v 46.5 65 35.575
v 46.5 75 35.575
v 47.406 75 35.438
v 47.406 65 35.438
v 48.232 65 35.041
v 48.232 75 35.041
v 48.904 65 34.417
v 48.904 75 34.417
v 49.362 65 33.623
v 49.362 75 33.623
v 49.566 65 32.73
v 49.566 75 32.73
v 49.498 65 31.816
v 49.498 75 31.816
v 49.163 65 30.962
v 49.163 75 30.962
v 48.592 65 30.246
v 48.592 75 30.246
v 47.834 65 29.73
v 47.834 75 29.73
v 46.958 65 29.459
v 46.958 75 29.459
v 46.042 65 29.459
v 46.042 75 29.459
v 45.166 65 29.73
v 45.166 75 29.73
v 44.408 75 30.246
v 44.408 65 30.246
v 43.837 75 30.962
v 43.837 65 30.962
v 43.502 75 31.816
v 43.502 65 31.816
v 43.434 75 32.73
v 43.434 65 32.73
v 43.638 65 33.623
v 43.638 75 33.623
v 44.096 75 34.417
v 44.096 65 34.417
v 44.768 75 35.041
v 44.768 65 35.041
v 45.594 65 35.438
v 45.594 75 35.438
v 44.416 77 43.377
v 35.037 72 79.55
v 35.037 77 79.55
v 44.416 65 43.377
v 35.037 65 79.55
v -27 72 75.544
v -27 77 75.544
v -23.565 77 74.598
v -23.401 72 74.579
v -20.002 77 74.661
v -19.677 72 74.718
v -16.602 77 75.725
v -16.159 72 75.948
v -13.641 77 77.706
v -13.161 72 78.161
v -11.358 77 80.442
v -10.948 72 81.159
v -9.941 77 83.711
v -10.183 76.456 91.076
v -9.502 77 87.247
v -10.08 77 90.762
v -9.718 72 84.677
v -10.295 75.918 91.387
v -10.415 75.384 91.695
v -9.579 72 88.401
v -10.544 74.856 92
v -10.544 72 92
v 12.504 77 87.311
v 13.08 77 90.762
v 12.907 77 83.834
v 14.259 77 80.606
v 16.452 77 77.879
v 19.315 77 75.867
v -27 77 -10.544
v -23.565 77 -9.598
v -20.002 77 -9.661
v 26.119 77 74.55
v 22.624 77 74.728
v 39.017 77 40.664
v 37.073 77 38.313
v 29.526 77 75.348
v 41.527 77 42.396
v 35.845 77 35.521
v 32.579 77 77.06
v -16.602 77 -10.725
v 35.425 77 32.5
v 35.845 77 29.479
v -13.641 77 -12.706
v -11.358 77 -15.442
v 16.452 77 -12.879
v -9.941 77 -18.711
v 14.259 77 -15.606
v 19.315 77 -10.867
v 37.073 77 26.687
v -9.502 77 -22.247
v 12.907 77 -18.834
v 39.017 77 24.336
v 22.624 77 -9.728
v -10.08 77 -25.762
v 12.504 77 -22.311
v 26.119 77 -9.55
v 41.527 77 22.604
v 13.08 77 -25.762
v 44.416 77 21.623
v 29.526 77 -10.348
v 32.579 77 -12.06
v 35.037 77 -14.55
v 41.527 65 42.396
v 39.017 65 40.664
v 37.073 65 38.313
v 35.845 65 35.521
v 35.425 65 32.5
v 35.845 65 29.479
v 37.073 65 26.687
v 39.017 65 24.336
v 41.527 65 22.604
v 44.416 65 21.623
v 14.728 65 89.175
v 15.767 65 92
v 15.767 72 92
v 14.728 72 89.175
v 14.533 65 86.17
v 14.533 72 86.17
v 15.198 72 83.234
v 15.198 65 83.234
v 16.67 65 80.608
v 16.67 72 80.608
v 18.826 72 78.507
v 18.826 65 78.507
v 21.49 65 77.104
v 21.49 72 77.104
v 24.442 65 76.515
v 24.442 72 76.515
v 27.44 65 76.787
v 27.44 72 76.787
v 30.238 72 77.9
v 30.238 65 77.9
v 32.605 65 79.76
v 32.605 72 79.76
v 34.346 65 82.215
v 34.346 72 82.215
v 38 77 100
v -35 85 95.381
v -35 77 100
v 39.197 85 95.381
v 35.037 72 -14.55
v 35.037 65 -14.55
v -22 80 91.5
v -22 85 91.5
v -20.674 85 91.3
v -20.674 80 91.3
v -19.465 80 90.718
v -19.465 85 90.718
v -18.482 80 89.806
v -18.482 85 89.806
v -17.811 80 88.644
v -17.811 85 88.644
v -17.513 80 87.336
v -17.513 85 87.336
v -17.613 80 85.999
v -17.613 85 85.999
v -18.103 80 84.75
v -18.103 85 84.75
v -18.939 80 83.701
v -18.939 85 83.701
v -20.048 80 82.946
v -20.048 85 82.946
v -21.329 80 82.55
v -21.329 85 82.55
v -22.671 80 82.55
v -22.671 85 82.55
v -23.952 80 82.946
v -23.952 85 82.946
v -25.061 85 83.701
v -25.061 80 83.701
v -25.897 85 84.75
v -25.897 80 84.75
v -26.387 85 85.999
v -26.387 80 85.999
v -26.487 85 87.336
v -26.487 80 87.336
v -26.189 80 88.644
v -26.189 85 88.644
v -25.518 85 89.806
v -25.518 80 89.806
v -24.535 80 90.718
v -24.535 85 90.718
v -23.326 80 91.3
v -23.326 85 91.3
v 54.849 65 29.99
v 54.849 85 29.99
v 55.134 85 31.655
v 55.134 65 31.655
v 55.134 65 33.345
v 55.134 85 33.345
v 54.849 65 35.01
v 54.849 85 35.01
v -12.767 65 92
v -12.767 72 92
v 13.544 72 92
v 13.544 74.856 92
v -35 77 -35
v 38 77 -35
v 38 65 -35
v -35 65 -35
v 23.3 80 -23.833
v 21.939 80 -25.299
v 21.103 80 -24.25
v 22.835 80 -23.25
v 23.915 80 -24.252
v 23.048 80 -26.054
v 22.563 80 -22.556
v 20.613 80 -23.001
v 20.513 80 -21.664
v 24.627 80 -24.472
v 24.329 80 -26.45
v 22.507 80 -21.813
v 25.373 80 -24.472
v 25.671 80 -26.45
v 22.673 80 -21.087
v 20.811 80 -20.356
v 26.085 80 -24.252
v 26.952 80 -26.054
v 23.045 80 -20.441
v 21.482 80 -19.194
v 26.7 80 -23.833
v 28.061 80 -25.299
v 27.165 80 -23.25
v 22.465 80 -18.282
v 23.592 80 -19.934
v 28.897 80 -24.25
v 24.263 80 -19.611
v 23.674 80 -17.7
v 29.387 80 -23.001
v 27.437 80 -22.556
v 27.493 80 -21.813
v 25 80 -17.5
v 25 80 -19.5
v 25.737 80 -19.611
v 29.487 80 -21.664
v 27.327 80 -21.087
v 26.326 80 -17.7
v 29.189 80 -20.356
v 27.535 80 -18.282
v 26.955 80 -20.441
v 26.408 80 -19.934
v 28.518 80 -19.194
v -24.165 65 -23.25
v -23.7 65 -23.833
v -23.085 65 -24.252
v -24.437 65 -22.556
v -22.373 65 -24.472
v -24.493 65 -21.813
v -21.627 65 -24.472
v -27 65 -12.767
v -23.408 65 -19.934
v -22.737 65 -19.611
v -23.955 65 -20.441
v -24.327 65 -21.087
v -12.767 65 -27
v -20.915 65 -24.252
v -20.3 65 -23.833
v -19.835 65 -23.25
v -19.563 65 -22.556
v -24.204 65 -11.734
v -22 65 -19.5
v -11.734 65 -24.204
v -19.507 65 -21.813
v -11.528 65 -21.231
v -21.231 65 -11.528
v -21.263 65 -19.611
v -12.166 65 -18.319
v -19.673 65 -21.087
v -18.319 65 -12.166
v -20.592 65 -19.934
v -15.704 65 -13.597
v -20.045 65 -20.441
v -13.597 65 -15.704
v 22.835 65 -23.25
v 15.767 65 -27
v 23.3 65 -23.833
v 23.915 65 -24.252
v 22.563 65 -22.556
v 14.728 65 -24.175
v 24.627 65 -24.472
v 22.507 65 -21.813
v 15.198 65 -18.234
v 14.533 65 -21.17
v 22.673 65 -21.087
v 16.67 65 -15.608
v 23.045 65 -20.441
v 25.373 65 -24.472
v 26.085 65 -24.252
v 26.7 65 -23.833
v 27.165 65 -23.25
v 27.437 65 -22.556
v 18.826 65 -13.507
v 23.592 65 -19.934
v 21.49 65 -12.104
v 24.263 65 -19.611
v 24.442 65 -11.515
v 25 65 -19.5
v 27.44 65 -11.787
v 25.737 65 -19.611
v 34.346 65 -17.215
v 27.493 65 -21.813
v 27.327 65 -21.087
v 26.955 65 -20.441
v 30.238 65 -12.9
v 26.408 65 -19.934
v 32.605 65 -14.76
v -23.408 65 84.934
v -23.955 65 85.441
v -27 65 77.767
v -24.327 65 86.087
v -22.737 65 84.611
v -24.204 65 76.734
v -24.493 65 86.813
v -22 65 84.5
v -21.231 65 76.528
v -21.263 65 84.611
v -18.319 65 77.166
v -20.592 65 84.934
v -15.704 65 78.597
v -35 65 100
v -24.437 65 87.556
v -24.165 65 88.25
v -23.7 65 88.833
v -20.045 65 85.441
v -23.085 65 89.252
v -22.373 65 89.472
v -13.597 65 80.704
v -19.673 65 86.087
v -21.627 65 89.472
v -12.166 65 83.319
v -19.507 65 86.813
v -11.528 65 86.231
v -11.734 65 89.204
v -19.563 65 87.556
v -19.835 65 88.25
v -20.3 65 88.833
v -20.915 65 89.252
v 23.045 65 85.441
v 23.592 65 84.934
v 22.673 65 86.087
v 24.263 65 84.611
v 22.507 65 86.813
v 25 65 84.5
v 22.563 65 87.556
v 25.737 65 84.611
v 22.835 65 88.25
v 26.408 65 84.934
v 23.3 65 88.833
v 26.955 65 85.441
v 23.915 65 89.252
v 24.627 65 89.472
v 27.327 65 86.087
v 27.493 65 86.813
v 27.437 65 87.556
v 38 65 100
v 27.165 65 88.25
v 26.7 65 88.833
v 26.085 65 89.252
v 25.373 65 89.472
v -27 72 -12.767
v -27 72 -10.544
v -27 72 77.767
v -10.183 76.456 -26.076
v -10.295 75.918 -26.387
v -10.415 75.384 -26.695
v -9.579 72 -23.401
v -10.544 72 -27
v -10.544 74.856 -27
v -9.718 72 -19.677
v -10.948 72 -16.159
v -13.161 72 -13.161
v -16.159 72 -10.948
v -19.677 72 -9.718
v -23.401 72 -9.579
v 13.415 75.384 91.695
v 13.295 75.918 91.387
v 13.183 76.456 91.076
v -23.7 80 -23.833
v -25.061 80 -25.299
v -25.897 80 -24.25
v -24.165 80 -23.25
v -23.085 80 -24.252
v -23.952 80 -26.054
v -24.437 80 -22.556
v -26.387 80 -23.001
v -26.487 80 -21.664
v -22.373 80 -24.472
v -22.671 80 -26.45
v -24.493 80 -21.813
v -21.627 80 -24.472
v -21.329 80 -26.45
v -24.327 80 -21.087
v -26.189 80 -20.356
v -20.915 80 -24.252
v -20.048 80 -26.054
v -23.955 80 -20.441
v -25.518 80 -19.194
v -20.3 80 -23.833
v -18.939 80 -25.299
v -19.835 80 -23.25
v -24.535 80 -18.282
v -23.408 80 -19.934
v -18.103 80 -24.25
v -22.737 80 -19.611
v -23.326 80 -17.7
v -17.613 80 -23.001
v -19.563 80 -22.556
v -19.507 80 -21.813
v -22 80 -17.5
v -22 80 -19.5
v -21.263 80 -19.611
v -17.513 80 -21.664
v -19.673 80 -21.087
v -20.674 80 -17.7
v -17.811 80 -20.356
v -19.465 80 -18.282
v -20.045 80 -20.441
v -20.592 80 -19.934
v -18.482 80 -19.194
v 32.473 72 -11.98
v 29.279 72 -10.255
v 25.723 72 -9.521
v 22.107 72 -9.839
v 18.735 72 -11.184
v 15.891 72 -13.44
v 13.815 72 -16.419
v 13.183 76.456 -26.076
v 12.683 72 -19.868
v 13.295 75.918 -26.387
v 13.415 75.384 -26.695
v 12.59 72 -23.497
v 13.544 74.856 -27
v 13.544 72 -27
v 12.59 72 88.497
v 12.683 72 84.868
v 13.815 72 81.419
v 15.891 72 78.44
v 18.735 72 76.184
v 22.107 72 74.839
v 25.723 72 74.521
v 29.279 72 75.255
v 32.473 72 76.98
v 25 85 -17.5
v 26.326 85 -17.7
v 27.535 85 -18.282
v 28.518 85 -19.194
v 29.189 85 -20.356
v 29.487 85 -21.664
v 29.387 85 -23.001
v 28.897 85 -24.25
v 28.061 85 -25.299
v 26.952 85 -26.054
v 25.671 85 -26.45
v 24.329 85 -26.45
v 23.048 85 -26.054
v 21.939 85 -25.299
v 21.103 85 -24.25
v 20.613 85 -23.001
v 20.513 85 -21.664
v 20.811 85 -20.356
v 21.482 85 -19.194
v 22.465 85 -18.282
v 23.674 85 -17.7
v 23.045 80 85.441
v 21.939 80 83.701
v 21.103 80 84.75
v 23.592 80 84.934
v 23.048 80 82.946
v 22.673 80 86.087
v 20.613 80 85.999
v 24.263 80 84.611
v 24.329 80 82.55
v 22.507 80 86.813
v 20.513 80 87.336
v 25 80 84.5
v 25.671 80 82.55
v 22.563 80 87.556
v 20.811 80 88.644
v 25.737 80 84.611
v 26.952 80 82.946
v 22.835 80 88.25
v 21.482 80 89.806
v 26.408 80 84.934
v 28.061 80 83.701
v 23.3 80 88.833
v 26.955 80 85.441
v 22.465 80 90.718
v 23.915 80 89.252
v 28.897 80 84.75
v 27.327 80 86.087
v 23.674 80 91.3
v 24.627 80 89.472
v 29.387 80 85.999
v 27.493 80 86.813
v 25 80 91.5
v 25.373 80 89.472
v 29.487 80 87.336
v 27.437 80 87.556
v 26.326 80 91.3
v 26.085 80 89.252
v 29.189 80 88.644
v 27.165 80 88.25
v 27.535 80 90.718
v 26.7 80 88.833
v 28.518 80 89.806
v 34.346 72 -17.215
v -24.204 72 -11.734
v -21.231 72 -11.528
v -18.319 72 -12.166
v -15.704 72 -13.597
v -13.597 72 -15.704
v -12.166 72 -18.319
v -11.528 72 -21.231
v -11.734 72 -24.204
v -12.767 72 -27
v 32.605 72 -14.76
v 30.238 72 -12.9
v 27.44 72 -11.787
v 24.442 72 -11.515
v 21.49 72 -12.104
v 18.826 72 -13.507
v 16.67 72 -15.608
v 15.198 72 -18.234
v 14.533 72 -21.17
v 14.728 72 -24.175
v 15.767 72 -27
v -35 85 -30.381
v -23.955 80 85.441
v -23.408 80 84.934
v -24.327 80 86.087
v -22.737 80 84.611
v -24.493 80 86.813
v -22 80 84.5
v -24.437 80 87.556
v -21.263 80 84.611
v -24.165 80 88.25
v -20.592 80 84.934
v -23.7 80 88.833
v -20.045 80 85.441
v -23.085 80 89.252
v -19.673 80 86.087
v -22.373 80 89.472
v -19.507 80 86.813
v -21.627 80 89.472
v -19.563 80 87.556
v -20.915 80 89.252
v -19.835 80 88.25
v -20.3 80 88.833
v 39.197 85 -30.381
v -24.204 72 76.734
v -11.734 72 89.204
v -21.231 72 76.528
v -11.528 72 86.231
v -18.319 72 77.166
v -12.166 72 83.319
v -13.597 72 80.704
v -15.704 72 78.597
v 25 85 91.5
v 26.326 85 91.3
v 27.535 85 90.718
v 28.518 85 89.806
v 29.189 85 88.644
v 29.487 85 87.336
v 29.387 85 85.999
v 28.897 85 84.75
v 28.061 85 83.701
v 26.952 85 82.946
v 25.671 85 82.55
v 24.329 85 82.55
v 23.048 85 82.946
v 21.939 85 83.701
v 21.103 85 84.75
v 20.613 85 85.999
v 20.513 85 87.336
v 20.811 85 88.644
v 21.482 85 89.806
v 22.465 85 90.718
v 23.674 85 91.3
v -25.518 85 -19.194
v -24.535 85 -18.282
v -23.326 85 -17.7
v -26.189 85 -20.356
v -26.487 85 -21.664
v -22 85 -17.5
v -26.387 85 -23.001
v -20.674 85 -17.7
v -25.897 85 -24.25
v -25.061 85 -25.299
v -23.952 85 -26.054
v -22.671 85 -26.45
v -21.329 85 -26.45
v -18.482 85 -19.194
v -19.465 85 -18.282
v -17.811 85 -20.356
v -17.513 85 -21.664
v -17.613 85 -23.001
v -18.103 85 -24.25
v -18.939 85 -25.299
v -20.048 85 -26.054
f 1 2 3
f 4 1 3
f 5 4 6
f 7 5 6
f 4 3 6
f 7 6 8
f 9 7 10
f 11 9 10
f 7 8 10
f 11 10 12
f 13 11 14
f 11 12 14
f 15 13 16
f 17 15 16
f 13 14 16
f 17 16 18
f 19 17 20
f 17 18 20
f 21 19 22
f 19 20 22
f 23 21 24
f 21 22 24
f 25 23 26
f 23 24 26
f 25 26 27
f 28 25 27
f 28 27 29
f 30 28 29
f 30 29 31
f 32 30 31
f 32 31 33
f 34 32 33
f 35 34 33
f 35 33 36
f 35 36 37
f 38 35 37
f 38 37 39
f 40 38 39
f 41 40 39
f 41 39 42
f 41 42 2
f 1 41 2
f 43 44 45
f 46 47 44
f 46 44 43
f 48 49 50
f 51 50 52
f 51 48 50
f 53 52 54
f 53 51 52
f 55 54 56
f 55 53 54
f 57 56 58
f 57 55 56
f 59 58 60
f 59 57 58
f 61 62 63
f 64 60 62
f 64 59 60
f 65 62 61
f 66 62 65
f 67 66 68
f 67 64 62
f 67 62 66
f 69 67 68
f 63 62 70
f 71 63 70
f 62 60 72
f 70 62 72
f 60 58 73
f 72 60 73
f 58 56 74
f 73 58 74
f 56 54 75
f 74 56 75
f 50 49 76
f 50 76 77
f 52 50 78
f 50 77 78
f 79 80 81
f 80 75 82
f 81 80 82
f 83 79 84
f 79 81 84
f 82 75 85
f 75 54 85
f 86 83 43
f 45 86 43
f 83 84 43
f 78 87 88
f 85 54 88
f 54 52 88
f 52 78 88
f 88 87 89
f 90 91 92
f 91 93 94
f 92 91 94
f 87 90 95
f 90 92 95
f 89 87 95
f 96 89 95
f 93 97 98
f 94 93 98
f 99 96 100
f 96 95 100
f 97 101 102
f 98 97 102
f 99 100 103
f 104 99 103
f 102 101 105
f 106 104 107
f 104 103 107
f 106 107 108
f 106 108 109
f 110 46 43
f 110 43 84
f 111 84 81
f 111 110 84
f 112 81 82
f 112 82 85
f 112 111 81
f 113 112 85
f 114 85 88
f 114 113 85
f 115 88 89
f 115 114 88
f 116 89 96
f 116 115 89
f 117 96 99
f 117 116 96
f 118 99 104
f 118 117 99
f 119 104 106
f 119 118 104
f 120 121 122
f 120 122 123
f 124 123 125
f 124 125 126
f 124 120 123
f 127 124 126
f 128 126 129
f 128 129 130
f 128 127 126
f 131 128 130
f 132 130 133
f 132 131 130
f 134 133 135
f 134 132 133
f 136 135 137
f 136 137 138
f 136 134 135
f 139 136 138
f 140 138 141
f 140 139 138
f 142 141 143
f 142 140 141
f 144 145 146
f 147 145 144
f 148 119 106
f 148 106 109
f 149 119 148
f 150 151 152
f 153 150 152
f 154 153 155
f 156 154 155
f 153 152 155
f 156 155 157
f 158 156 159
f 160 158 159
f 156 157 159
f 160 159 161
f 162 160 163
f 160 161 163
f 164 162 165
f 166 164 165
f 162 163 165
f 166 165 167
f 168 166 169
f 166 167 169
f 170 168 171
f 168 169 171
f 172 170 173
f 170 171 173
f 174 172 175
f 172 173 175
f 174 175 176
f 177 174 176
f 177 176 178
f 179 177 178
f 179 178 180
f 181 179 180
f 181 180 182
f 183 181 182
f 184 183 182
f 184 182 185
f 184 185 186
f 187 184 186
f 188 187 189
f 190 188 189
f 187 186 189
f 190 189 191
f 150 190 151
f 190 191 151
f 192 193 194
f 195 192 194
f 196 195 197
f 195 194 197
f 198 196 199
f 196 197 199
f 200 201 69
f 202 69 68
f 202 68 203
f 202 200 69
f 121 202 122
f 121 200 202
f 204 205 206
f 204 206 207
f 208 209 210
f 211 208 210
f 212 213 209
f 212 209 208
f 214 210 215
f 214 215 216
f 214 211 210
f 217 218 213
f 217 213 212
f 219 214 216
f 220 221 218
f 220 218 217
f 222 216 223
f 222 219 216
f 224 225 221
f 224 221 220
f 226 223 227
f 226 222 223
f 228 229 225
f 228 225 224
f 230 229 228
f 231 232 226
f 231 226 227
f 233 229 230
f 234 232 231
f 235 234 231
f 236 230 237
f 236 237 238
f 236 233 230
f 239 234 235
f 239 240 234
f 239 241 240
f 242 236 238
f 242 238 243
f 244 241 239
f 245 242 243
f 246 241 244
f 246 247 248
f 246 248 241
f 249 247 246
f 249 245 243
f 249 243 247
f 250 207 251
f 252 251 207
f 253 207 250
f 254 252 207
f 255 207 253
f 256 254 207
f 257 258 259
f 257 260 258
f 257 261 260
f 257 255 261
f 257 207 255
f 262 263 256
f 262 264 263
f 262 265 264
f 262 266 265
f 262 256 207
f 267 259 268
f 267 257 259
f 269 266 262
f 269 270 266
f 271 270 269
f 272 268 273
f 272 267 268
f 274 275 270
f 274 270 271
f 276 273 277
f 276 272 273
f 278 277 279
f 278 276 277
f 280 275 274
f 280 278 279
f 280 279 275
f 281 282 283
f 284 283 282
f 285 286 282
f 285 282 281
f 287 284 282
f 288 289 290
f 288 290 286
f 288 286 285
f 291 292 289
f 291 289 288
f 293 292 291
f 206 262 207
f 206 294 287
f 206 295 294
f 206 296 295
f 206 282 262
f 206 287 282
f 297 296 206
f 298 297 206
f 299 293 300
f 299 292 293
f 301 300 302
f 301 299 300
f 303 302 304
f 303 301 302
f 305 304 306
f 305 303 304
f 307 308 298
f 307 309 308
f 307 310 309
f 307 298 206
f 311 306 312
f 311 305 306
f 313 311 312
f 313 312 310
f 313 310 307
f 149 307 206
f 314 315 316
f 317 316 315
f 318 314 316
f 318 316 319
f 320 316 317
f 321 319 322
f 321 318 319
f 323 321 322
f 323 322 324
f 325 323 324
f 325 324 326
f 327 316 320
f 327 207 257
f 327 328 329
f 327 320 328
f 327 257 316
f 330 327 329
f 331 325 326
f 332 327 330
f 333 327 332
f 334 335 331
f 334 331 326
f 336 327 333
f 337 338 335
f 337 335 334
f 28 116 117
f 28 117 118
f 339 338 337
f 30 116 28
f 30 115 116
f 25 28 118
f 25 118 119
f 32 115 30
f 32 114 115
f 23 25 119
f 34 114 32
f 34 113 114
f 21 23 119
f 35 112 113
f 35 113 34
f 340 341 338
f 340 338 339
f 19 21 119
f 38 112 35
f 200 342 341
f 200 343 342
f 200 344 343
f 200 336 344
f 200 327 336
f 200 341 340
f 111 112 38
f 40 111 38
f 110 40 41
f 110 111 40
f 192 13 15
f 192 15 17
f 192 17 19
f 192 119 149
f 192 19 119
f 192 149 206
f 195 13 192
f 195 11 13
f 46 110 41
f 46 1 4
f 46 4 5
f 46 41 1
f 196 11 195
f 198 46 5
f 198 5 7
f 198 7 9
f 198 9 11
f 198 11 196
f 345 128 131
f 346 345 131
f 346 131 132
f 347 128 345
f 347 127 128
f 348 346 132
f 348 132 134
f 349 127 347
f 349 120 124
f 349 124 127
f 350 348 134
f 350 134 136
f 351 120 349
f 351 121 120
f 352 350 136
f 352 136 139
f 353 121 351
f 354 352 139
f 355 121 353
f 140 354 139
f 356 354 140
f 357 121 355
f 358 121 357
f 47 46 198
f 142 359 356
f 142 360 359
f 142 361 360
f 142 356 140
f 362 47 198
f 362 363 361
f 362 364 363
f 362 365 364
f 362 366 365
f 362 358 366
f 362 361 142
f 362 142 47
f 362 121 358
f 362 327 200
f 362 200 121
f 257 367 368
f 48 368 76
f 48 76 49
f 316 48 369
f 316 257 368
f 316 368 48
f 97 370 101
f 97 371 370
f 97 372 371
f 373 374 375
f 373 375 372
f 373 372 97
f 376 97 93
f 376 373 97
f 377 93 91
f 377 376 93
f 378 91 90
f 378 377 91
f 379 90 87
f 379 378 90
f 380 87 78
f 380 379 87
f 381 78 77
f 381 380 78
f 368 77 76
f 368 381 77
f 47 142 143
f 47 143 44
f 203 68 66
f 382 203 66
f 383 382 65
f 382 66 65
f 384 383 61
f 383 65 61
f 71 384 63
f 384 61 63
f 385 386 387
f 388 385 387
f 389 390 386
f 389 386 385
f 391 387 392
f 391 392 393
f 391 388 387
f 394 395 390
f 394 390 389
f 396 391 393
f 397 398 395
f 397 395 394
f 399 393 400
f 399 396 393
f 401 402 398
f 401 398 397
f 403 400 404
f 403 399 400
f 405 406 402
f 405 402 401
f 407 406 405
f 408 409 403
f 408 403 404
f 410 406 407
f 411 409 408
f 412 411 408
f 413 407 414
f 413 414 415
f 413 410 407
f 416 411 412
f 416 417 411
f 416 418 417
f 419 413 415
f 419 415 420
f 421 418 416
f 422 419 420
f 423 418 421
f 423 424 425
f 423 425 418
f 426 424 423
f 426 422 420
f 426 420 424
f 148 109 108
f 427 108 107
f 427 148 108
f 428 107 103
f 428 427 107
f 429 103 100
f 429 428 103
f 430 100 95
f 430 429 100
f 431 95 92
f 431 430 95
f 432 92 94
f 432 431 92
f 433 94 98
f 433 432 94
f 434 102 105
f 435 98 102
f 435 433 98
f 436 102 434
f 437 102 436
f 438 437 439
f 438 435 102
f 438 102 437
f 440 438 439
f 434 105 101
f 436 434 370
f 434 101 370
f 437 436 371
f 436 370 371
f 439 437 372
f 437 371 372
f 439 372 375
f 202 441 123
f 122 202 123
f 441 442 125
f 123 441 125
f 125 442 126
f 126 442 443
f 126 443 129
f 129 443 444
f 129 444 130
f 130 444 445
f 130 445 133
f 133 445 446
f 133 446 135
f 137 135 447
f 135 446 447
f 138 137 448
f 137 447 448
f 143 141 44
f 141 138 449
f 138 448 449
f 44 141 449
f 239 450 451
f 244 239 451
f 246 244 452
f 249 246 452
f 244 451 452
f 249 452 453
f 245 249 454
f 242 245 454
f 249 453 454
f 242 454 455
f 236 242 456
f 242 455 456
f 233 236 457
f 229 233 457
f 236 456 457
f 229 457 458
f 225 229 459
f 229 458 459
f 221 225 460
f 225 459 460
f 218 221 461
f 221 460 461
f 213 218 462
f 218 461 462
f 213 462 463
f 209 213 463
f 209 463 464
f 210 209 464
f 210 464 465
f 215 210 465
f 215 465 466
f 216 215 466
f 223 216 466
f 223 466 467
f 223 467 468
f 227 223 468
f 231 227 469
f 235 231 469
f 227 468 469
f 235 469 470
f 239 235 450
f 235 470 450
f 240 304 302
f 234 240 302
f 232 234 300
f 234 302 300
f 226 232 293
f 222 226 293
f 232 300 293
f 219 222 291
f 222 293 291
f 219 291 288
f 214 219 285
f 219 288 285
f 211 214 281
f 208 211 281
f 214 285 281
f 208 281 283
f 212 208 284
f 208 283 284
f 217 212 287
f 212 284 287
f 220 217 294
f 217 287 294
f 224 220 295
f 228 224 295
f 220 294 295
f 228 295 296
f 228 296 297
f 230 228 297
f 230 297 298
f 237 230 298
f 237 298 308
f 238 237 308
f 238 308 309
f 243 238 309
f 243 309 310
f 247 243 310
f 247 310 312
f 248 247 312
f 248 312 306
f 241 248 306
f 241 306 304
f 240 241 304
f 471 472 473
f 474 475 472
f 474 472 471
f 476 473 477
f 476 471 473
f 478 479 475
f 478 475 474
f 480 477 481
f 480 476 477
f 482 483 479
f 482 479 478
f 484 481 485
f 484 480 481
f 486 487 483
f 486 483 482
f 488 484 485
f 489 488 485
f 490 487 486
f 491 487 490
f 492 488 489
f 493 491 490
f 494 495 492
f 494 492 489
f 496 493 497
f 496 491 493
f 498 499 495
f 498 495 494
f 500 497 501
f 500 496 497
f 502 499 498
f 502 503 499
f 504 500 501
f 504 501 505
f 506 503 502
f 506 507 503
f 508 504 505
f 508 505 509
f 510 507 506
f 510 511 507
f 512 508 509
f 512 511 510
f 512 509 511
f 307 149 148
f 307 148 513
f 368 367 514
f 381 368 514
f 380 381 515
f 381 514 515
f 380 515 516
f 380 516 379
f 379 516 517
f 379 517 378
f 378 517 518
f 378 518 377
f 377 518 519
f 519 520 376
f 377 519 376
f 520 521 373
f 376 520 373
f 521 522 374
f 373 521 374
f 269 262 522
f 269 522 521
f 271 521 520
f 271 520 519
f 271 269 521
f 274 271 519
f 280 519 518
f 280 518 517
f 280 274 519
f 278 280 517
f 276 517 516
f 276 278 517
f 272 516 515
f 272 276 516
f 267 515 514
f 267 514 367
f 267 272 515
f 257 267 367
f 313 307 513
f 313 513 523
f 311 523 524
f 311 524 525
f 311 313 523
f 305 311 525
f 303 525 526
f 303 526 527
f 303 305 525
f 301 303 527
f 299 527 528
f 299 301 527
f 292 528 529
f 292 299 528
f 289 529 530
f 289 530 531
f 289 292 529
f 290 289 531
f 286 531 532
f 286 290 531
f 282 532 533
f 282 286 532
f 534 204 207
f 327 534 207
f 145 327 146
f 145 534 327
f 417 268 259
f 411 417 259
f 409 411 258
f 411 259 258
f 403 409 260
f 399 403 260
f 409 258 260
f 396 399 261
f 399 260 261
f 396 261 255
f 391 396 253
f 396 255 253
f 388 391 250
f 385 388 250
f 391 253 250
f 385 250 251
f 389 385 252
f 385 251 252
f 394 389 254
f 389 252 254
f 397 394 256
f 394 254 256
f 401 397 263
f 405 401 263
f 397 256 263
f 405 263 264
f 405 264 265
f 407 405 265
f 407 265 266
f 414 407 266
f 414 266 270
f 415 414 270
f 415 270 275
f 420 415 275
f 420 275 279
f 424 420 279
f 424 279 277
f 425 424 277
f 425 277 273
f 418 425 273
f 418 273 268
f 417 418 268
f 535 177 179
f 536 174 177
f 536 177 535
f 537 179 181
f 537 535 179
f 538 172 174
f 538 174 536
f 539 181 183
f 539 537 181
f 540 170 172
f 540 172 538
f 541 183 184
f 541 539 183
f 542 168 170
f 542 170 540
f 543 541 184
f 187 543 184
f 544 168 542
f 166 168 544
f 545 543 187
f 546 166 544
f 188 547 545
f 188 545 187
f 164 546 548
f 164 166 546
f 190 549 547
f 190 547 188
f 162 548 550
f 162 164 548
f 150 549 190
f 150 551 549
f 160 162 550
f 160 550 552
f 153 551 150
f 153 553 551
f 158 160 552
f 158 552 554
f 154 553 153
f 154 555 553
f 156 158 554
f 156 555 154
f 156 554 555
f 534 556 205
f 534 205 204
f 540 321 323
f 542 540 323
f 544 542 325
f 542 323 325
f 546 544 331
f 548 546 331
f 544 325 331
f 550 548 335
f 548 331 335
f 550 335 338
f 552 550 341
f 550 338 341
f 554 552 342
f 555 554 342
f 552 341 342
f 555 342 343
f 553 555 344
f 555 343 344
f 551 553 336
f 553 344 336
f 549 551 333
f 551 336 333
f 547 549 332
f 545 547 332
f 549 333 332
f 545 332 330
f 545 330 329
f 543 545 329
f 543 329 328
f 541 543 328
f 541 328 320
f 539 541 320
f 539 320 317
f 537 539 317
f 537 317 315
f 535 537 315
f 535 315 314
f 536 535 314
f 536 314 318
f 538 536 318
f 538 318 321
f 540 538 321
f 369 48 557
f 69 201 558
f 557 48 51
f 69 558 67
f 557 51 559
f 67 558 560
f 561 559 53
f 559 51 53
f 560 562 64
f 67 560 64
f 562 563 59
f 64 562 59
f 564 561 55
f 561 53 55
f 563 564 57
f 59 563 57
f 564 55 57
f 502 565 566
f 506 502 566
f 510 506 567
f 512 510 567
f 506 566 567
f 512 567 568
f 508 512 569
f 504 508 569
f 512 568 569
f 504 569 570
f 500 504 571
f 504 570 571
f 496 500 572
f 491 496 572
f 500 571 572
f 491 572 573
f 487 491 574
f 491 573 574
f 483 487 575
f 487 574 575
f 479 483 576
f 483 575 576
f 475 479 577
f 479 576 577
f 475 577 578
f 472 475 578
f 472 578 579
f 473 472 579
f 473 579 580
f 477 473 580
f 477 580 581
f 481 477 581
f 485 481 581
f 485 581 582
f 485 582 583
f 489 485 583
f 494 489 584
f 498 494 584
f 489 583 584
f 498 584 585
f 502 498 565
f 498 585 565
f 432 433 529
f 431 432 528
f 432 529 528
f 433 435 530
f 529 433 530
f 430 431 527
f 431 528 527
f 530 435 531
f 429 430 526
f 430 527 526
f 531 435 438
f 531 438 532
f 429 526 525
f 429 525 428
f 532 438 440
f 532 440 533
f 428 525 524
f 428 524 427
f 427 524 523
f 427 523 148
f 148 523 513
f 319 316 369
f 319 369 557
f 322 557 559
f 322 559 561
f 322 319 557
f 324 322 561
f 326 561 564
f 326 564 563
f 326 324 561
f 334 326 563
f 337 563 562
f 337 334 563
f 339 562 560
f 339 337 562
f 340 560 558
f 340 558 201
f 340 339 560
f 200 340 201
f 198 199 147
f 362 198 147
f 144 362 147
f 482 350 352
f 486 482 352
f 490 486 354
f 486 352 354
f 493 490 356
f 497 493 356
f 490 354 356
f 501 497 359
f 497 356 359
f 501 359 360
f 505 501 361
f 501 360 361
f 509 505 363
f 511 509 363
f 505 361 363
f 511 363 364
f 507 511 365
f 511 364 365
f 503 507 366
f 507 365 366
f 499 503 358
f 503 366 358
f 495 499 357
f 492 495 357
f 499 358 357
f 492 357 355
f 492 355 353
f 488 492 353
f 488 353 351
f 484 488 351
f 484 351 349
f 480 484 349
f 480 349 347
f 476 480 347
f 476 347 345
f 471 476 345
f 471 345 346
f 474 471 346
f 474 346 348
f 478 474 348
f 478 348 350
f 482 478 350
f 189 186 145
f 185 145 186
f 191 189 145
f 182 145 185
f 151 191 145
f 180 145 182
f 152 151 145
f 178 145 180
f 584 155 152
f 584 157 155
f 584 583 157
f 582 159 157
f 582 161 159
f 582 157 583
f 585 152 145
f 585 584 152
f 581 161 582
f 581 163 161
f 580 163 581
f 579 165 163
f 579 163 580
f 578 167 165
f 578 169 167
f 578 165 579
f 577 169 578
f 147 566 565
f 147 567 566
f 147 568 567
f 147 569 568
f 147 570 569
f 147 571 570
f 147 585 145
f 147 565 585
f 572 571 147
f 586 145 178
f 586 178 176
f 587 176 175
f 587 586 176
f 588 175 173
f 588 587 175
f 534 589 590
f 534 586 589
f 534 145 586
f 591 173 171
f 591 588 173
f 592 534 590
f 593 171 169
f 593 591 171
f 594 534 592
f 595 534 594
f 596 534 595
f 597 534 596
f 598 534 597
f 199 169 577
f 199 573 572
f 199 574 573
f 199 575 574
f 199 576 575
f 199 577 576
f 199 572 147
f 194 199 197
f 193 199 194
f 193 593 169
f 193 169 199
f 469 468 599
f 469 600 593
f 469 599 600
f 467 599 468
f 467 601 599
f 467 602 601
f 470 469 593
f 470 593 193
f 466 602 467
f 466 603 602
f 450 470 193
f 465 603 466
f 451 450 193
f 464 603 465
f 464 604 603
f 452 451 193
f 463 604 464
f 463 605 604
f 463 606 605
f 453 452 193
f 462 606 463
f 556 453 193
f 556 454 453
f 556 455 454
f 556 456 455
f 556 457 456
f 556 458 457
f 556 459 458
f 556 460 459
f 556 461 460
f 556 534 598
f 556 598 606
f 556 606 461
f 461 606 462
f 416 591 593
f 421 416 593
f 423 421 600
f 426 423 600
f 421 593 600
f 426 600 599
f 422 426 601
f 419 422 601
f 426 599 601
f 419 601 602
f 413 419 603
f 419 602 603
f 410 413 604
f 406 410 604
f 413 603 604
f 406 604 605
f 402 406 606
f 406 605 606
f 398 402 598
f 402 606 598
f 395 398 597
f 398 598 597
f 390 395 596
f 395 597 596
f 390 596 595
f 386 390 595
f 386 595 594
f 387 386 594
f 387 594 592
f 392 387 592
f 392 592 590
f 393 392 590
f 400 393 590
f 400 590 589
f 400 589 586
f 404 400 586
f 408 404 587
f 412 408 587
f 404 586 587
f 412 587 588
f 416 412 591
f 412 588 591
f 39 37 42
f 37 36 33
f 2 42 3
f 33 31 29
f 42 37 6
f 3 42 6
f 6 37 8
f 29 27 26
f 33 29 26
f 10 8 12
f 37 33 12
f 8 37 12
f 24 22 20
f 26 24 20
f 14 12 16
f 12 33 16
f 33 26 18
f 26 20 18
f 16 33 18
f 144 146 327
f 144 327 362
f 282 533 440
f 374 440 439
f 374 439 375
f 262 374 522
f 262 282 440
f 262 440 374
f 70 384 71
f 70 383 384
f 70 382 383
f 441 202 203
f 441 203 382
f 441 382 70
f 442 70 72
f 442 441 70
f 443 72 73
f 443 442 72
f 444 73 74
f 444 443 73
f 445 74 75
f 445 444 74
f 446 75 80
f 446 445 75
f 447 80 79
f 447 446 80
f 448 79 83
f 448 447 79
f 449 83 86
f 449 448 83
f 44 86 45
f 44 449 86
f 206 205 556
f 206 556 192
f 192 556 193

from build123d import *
from OCP.BRepFilletAPI import BRepFilletAPI_MakeChamfer

# Parameters (mm, degrees)
SALIENTE_EXTRUIR2_DEPTH     = 23
CROQUIS7_R                  = 20
CORTAR_EXTRUIR1_DEPTH       = 16
CROQUIS8_R                  = 10.25
CORTAR_EXTRUIR2_DEPTH       = 65.838641661
SALIENTE_EXTRUIR3_START     = 32
CROQUIS9_R                  = 20
CROQUIS9_R_2                = 3.075
CROQUIS9_R_3                = 10.25
SALIENTE_EXTRUIR3_DEPTH     = 32
CORTAR_EXTRUIR3_START       = -7
CROQUIS10_R                 = 20
CORTAR_EXTRUIR3_DEPTH       = 112.607172695
SALIENTE_EXTRUIR4_START     = 20
CROQUIS11_R                 = 3.075
CROQUIS11_R_2               = 20
SALIENTE_EXTRUIR4_DEPTH     = 20
CROQUIS12_R                 = 63
CORTAR_EXTRUIR4_DEPTH       = 3
CROQUIS13_R                 = 55
CORTAR_EXTRUIR5_DEPTH       = 10
SALIENTE_EXTRUIR5_START     = 10
SALIENTE_EXTRUIR5_DEPTH     = 10
CHAFL_N1_SIZE               = 8
CHAFL_N1_SIZE2              = 4.618802154
CROQUIS15_R                 = 6
CORTAR_EXTRUIR6_DEPTH       = 14.8
CORTAR_EXTRUIR7_REACH       = 233.334
CROQUIS17_R                 = 1.5
CORTAR_EXTRUIR9_REACH       = 225.907
CROQUIS19_R                 = 1.5
CORTAR_EXTRUIR10_START      = -50
CORTAR_EXTRUIR10_DEPTH      = 50
CROQUIS22_R                 = 3
CORTAR_EXTRUIR12_DEPTH      = 3
CROQUIS23_R                 = 3
CORTAR_EXTRUIR13_DEPTH      = 3
CROQUIS25_R                 = 2.5
CORTAR_EXTRUIR15_DEPTH      = 30
CROQUIS24_R                 = 2.5
CORTAR_EXTRUIR14_DEPTH      = 30
CROQUIS26_R                 = 2
CORTAR_EXTRUIR16_DEPTH      = 223.070371729
CROQUIS27_R                 = 3.5
CORTAR_EXTRUIR17_DEPTH      = 5
CORTAR_EXTRUIR18_DEPTH      = 3.25
CORTAR_EXTRUIR20_DEPTH      = 223.070371729
CORTAR_EXTRUIR20_DEPTH_BACK = 10
CROQUIS31_R                 = 2.5
CORTAR_EXTRUIR21_DEPTH      = 217.079267863
CROQUIS32_R                 = 4.5
CORTAR_EXTRUIR22_DEPTH      = 5
SALIENTE_EXTRUIR6_START     = 4
CROQUIS33_R                 = 55
CROQUIS33_R_2               = 6
SALIENTE_EXTRUIR6_DEPTH     = 4
SALIENTE_EXTRUIR7_START     = 3.35
CROQUIS34_R                 = 16.85
CROQUIS34_R_2               = 6
SALIENTE_EXTRUIR7_DEPTH     = 3.35
SALIENTE_EXTRUIR8_START     = 29
CROQUIS35_R                 = 10
CROQUIS35_R_2               = 6
SALIENTE_EXTRUIR8_DEPTH     = 29
CORTAR_EXTRUIR23_DEPTH      = 218.721088781
CORTAR_EXTRUIR23_DEPTH_BACK = 218.721088781
CROQUIS36_OUTSIDE_W         = 281.136
CROQUIS36_OUTSIDE_H         = 190.636
SALIENTE_EXTRUIR9_REACH     = 117.947
CROQUIS37_R                 = 20
VACIADO1_START              = 65
VACIADO1_DEPTH              = 12
VACIADO1_2_DEPTH            = 7
VACIADO1_START_2            = -12.766907344
VACIADO1_3_DEPTH            = 28.533814688


with BuildPart() as part:
    # Croquis2 → Saliente-Extruir2 (new body)
    with BuildSketch(Plane(origin=(0, 0, 0), x_dir=(1, 0, 0), z_dir=(0, 1, 0))):
        with BuildLine():
            Line((32.725022686, -35), (-35, -35))
            Line((-35, -35), (-35, 35))
            Line((-35, 35), (38, 35))
            Line((38, 35), (52.182846342, -19.705264464))
            ThreePointArc((52.182846342, -19.705264464), (38.869791903, -20.762030653), (32.5, -32.5))
            ThreePointArc((32.5, -32.5), (32.556369153, -33.755053307), (32.725022686, -35))
        make_face()
    extrude(amount=SALIENTE_EXTRUIR2_DEPTH)

    # Croquis7 → Cortar-Extruir1 (cut)
    with BuildSketch(Plane(origin=(0, 23, 0), x_dir=(1, 0, 0), z_dir=(0, 1, 0))):
        with Locations(Location((1.5, -1.5, 0), (0, 0, 270))):
            Circle(CROQUIS7_R)
    extrude(amount=-CORTAR_EXTRUIR1_DEPTH, mode=Mode.SUBTRACT)

    # Croquis8 → Cortar-Extruir2 (cut, through all)
    with BuildSketch(Plane(origin=(0, 7, 0), x_dir=(1, 0, 0), z_dir=(0, 1, 0))):
        with Locations(Location((1.5, -1.5, 0), (0, 0, 270))):
            Circle(CROQUIS8_R)
    extrude(amount=-CORTAR_EXTRUIR2_DEPTH, mode=Mode.SUBTRACT)

    # Croquis9 → Saliente-Extruir3 (add)
    with BuildSketch(Plane(origin=(0, 23, 0), x_dir=(1, 0, 0), z_dir=(0, 1, 0)).offset(SALIENTE_EXTRUIR3_START)):
        with BuildLine():
            Line((-35, 35), (-35, -100))
            Line((-35, -100), (38, -100))
            Line((38, -100), (54.849357366, -35.009621588))
            ThreePointArc((54.849357366, -35.009621588), (55.169388384, -32.5), (54.849357366, -29.990378412))
            Line((54.849357366, -29.990378412), (38, 35))
            Line((38, 35), (-35, 35))
        make_face()
        with Locations(Location((1.5, -1.5, 0), (0, 0, 270))):
            Circle(CROQUIS9_R, mode=Mode.SUBTRACT)
        with Locations(Location((46.5, -32.5, 0), (0, 0, 270))):
            Circle(CROQUIS9_R_2, mode=Mode.SUBTRACT)
        with Locations(Location((1.5, -63.5, 0), (0, 0, 90))):
            Circle(CROQUIS9_R_3, mode=Mode.SUBTRACT)
    extrude(amount=-SALIENTE_EXTRUIR3_DEPTH)

    # Croquis10 → Cortar-Extruir3 (cut, through all)
    with BuildSketch(Plane.XZ.offset(-23).offset(CORTAR_EXTRUIR3_START)):
        with Locations(Location((1.5, 63.5, 0), (0, 0, 90))):
            Circle(CROQUIS10_R)
    extrude(amount=-CORTAR_EXTRUIR3_DEPTH, mode=Mode.SUBTRACT)

    # Croquis11 → Saliente-Extruir4 (add)
    with BuildSketch(Plane(origin=(0, 55, 0), x_dir=(1, 0, 0), z_dir=(0, 1, 0)).offset(SALIENTE_EXTRUIR4_START)):
        with BuildLine():
            Line((123, 35), (-35, 35))
            Line((-35, 35), (-35, -100))
            Line((-35, -100), (123, -100))
            ThreePointArc((123, -100), (190.5, -32.5), (123, 35))
        make_face()
        with Locations(Location((46.5, -32.5, 0), (0, 0, 270))):
            Circle(CROQUIS11_R, mode=Mode.SUBTRACT)
        with Locations(Location((1.5, -63.5, 0), (0, 0, 270))):
            Circle(CROQUIS11_R_2, mode=Mode.SUBTRACT)
        with Locations(Location((1.5, -1.5, 0), (0, 0, 270))):
            Circle(CROQUIS11_R_2, mode=Mode.SUBTRACT)
    extrude(amount=-SALIENTE_EXTRUIR4_DEPTH)

    # Croquis12 → Cortar-Extruir4 (cut)
    with BuildSketch(Plane.XZ.offset(-55)):
        with Locations(Location((123, 32.5, 0), (0, 0, 270))):
            Circle(CROQUIS12_R)
    extrude(amount=-CORTAR_EXTRUIR4_DEPTH, mode=Mode.SUBTRACT)

    # Croquis13 → Cortar-Extruir5 (cut)
    with BuildSketch(Plane.XZ.offset(-58)):
        with Locations(Location((123, 32.5, 0), (0, 0, 270))):
            Circle(CROQUIS13_R)
    extrude(amount=-CORTAR_EXTRUIR5_DEPTH, mode=Mode.SUBTRACT)

    # Croquis14 → Saliente-Extruir5 (add)
    with BuildSketch(Plane(origin=(0, 75, 0), x_dir=(1, 0, 0), z_dir=(0, 1, 0)).offset(SALIENTE_EXTRUIR5_START)):
        with BuildLine():
            Line((-35, -100), (123, -100))
            ThreePointArc((123, -100), (190.5, -32.5), (123, 35))
            Line((123, 35), (-35, 35))
            Line((-35, 35), (-35, -100))
        make_face()
    extrude(amount=-SALIENTE_EXTRUIR5_DEPTH)

    # Chaflán1: one chamfer whose edges measure the first distance from different faces: ONE call of the kernel's chamfer builder (chamfer() names one face for all edges)
    chafl_n1_edges_1 = [part.edges().sort_by_distance(p)[0] for p in [
        (190.5, 85, 32.5),
    ]]
    chafl_n1_side_1 = [part.faces().sort_by_distance(p)[0] for p in [
        (190.5, 70, 32.5),
    ]]
    chafl_n1_edges_2 = [part.edges().sort_by_distance(p)[0] for p in [
        (44, 85, -35),
    ]]
    chafl_n1_side_2 = [part.faces().sort_by_distance(p)[0] for p in [
        (24.509708738, 50.509708738, -35),
    ]]
    chafl_n1_edges_3 = [part.edges().sort_by_distance(p)[0] for p in [
        (44, 85, 100),
    ]]
    chafl_n1_side_3 = [part.faces().sort_by_distance(p)[0] for p in [
        (29.969474279, 59.765969474, 100),
    ]]
    chafl_n1 = BRepFilletAPI_MakeChamfer(part.part.solid().wrapped)
    for e in chafl_n1_edges_1:
        chafl_n1.Add(CHAFL_N1_SIZE, CHAFL_N1_SIZE2, e.wrapped, chafl_n1_side_1[0].wrapped)  # the first distance lies on this face
    for e in chafl_n1_edges_2:
        chafl_n1.Add(CHAFL_N1_SIZE, CHAFL_N1_SIZE2, e.wrapped, chafl_n1_side_2[0].wrapped)  # the first distance lies on this face
    for e in chafl_n1_edges_3:
        chafl_n1.Add(CHAFL_N1_SIZE, CHAFL_N1_SIZE2, e.wrapped, chafl_n1_side_3[0].wrapped)  # the first distance lies on this face
    add(Compound.cast(chafl_n1.Shape()), mode=Mode.REPLACE)

    # Croquis15 → Cortar-Extruir6 (cut)
    with BuildSketch(Plane.XZ.offset(-68)):
        with Locations(Location((123, 32.5, 0), (0, 0, 270))):
            Circle(CROQUIS15_R)
    extrude(amount=-CORTAR_EXTRUIR6_DEPTH, mode=Mode.SUBTRACT)

    # Croquis17 → Cortar-Extruir7 (cut, up to next)
    with BuildSketch(Plane.XZ, mode=Mode.PRIVATE) as cortar_extruir7_sk1:
        with Locations(Location((16.5, 1.5, 0), (0, 0, 270))):
            Circle(CROQUIS17_R)
    cortar_extruir7_tool1 = extrude(cortar_extruir7_sk1.sketch, amount=-CORTAR_EXTRUIR7_REACH, mode=Mode.PRIVATE) & part.part
    # Croquis17 → Cortar-Extruir7 (cut, up to next)
    with BuildSketch(Plane.XZ, mode=Mode.PRIVATE) as cortar_extruir7_sk2:
        with Locations(Location((-6, -11.490381057, 0), (0, 0, 270))):
            Circle(CROQUIS17_R)
    cortar_extruir7_tool2 = extrude(cortar_extruir7_sk2.sketch, amount=-CORTAR_EXTRUIR7_REACH, mode=Mode.PRIVATE) & part.part
    # Croquis17 → Cortar-Extruir7 (cut, up to next)
    with BuildSketch(Plane.XZ, mode=Mode.PRIVATE) as cortar_extruir7_sk3:
        with Locations(Location((-6, 14.490381057, 0), (0, 0, 270))):
            Circle(CROQUIS17_R)
    cortar_extruir7_tool3 = extrude(cortar_extruir7_sk3.sketch, amount=-CORTAR_EXTRUIR7_REACH, mode=Mode.PRIVATE) & part.part
    # Croquis17 → Cortar-Extruir7 (cut, up to next)
    with BuildSketch(Plane.XZ, mode=Mode.PRIVATE) as cortar_extruir7_sk4:
        with Locations(Location((13.624355653, 8.5, 0), (0, 0, 270))):
            Circle(CROQUIS17_R)
    cortar_extruir7_tool4 = extrude(cortar_extruir7_sk4.sketch, amount=-CORTAR_EXTRUIR7_REACH, mode=Mode.PRIVATE) & part.part
    # Croquis17 → Cortar-Extruir7 (cut, up to next)
    with BuildSketch(Plane.XZ, mode=Mode.PRIVATE) as cortar_extruir7_sk5:
        with Locations(Location((1.5, -12.5, 0), (0, 0, 270))):
            Circle(CROQUIS17_R)
    cortar_extruir7_tool5 = extrude(cortar_extruir7_sk5.sketch, amount=-CORTAR_EXTRUIR7_REACH, mode=Mode.PRIVATE) & part.part
    # Croquis17 → Cortar-Extruir7 (cut, up to next)
    with BuildSketch(Plane.XZ, mode=Mode.PRIVATE) as cortar_extruir7_sk6:
        with Locations(Location((-10.624355653, 8.5, 0), (0, 0, 270))):
            Circle(CROQUIS17_R)
    cortar_extruir7_tool6 = extrude(cortar_extruir7_sk6.sketch, amount=-CORTAR_EXTRUIR7_REACH, mode=Mode.PRIVATE) & part.part
    add(cortar_extruir7_tool1.solids().sort_by_distance((16.5, 0, 1.5))[0], mode=Mode.SUBTRACT)
    add(cortar_extruir7_tool2.solids().sort_by_distance((-6, 0, -11.490381))[0], mode=Mode.SUBTRACT)
    add(cortar_extruir7_tool3.solids().sort_by_distance((-6, 0, 14.490381))[0], mode=Mode.SUBTRACT)
    add(cortar_extruir7_tool4.solids().sort_by_distance((13.624356, 0, 8.5))[0], mode=Mode.SUBTRACT)
    add(cortar_extruir7_tool5.solids().sort_by_distance((1.5, 0, -12.5))[0], mode=Mode.SUBTRACT)
    add(cortar_extruir7_tool6.solids().sort_by_distance((-10.624356, 0, 8.5))[0], mode=Mode.SUBTRACT)

    # Croquis19 → Cortar-Extruir9 (cut, up to next)
    with BuildSketch(Plane.XZ.offset(-23), mode=Mode.PRIVATE) as cortar_extruir9_sk1:
        with Locations(Location((16.5, 63.5, 0), (0, 0, 270))):
            Circle(CROQUIS19_R)
    cortar_extruir9_tool1 = extrude(cortar_extruir9_sk1.sketch, amount=-CORTAR_EXTRUIR9_REACH, mode=Mode.PRIVATE) & part.part
    # Croquis19 → Cortar-Extruir9 (cut, up to next)
    with BuildSketch(Plane.XZ.offset(-23), mode=Mode.PRIVATE) as cortar_extruir9_sk2:
        with Locations(Location((-6, 50.509618943, 0), (0, 0, 270))):
            Circle(CROQUIS19_R)
    cortar_extruir9_tool2 = extrude(cortar_extruir9_sk2.sketch, amount=-CORTAR_EXTRUIR9_REACH, mode=Mode.PRIVATE) & part.part
    # Croquis19 → Cortar-Extruir9 (cut, up to next)
    with BuildSketch(Plane.XZ.offset(-23), mode=Mode.PRIVATE) as cortar_extruir9_sk3:
        with Locations(Location((-6, 76.490381057, 0), (0, 0, 270))):
            Circle(CROQUIS19_R)
    cortar_extruir9_tool3 = extrude(cortar_extruir9_sk3.sketch, amount=-CORTAR_EXTRUIR9_REACH, mode=Mode.PRIVATE) & part.part
    # Croquis19 → Cortar-Extruir9 (cut, up to next)
    with BuildSketch(Plane.XZ.offset(-23), mode=Mode.PRIVATE) as cortar_extruir9_sk4:
        with Locations(Location((13.624355653, 70.5, 0), (0, 0, 270))):
            Circle(CROQUIS19_R)
    cortar_extruir9_tool4 = extrude(cortar_extruir9_sk4.sketch, amount=-CORTAR_EXTRUIR9_REACH, mode=Mode.PRIVATE) & part.part
    # Croquis19 → Cortar-Extruir9 (cut, up to next)
    with BuildSketch(Plane.XZ.offset(-23), mode=Mode.PRIVATE) as cortar_extruir9_sk5:
        with Locations(Location((1.5, 49.5, 0), (0, 0, 270))):
            Circle(CROQUIS19_R)
    cortar_extruir9_tool5 = extrude(cortar_extruir9_sk5.sketch, amount=-CORTAR_EXTRUIR9_REACH, mode=Mode.PRIVATE) & part.part
    # Croquis19 → Cortar-Extruir9 (cut, up to next)
    with BuildSketch(Plane.XZ.offset(-23), mode=Mode.PRIVATE) as cortar_extruir9_sk6:
        with Locations(Location((-10.624355653, 70.5, 0), (0, 0, 270))):
            Circle(CROQUIS19_R)
    cortar_extruir9_tool6 = extrude(cortar_extruir9_sk6.sketch, amount=-CORTAR_EXTRUIR9_REACH, mode=Mode.PRIVATE) & part.part
    add(cortar_extruir9_tool1.solids().sort_by_distance((16.5, 23, 63.5))[0], mode=Mode.SUBTRACT)
    add(cortar_extruir9_tool2.solids().sort_by_distance((-6, 23, 50.509619))[0], mode=Mode.SUBTRACT)
    add(cortar_extruir9_tool3.solids().sort_by_distance((-6, 23, 76.490381))[0], mode=Mode.SUBTRACT)
    add(cortar_extruir9_tool4.solids().sort_by_distance((13.624356, 23, 70.5))[0], mode=Mode.SUBTRACT)
    add(cortar_extruir9_tool5.solids().sort_by_distance((1.5, 23, 49.5))[0], mode=Mode.SUBTRACT)
    add(cortar_extruir9_tool6.solids().sort_by_distance((-10.624356, 23, 70.5))[0], mode=Mode.SUBTRACT)

    # Croquis20 → Cortar-Extruir10 (cut)
    with BuildSketch(Plane.XZ.offset(CORTAR_EXTRUIR10_START)):
        with BuildLine():
            Line((42.3656995, 5.747113524), (39.773106907, -4.252886476))
            ThreePointArc((39.773106907, -4.252886476), (38.705054743, -5.872620854), (36.869116213, -6.5))
            Line((36.869116213, -6.5), (19.83030278, -6.5))
            ThreePointArc((19.83030278, -6.5), (21.5, 1.5), (19.83030278, 9.5))
            Line((19.83030278, 9.5), (39.461708805, 9.5))
            ThreePointArc((39.461708805, 9.5), (41.834329659, 8.33593853), (42.3656995, 5.747113524))
        make_face()
    extrude(amount=CORTAR_EXTRUIR10_DEPTH, mode=Mode.SUBTRACT)

    # Croquis22 → Cortar-Extruir12 (cut)
    with BuildSketch(Plane.XZ):
        with Locations(Location((-6, 14.490381057, 0), (0, 0, 270))):
            Circle(CROQUIS22_R)
        with Locations(Location((-10.624355653, 8.5, 0), (0, 0, 270))):
            Circle(CROQUIS22_R)
        with Locations(Location((-6, -11.490381057, 0), (0, 0, 270))):
            Circle(CROQUIS22_R)
        with Locations(Location((1.5, -12.5, 0), (0, 0, 270))):
            Circle(CROQUIS22_R)
        with Locations(Location((16.5, 1.5, 0), (0, 0, 270))):
            Circle(CROQUIS22_R)
        with Locations(Location((13.624355653, 8.5, 0), (0, 0, 270))):
            Circle(CROQUIS22_R)
    extrude(amount=-CORTAR_EXTRUIR12_DEPTH, mode=Mode.SUBTRACT)

    # Croquis23 → Cortar-Extruir13 (cut)
    with BuildSketch(Plane.XZ.offset(-23)):
        with Locations(Location((-6, 76.490381057, 0), (0, 0, 270))):
            Circle(CROQUIS23_R)
        with Locations(Location((-10.624355653, 70.5, 0), (0, 0, 270))):
            Circle(CROQUIS23_R)
        with Locations(Location((-6, 50.509618943, 0), (0, 0, 270))):
            Circle(CROQUIS23_R)
        with Locations(Location((1.5, 49.5, 0), (0, 0, 270))):
            Circle(CROQUIS23_R)
        with Locations(Location((16.5, 63.5, 0), (0, 0, 270))):
            Circle(CROQUIS23_R)
        with Locations(Location((13.624355653, 70.5, 0), (0, 0, 270))):
            Circle(CROQUIS23_R)
    extrude(amount=-CORTAR_EXTRUIR13_DEPTH, mode=Mode.SUBTRACT)

    # Croquis25 → Cortar-Extruir15 (cut)
    with BuildSketch(Plane.XZ.offset(-23)):
        with Locations(Location((-28.75, 63.5, 0), (0, 0, 270))):
            Circle(CROQUIS25_R)
        with Locations(Location((29, 47, 0), (0, 0, 270))):
            Circle(CROQUIS25_R)
    extrude(amount=-CORTAR_EXTRUIR15_DEPTH, mode=Mode.SUBTRACT)

    # Croquis24 → Cortar-Extruir14 (cut)
    with BuildSketch(Plane.XZ):
        with Locations(Location((-28.75, 1.5, 0), (0, 0, 270))):
            Circle(CROQUIS24_R)
        with Locations(Location((25, 25, 0), (0, 0, 270))):
            Circle(CROQUIS24_R)
    extrude(amount=-CORTAR_EXTRUIR14_DEPTH, mode=Mode.SUBTRACT)

    # Croquis26 → Cortar-Extruir16 (cut, through all)
    with BuildSketch(Plane.XZ.offset(-55)):
        with Locations(Location((54.186793756, 85.381197846, 0), (0, 0, 270))):
            Circle(CROQUIS26_R)
        with Locations(Location((58.853460423, 67.381197846, 0), (0, 0, 270))):
            Circle(CROQUIS26_R)
        with Locations(Location((58.853460423, -2.381197846, 0), (0, 0, 90))):
            Circle(CROQUIS26_R)
        with Locations(Location((54.186793756, -20.381197846, 0), (0, 0, 90))):
            Circle(CROQUIS26_R)
    extrude(amount=-CORTAR_EXTRUIR16_DEPTH, mode=Mode.SUBTRACT)

    # Croquis27 → Cortar-Extruir17 (cut)
    with BuildSketch(Plane(origin=(0, 85, 0), x_dir=(1, 0, 0), z_dir=(0, 1, 0))):
        with Locations(Location((54.186793756, 20.381197846, 0), (0, 0, 270))):
            Circle(CROQUIS27_R)
        with Locations(Location((58.853460423, 2.381197846, 0), (0, 0, 270))):
            Circle(CROQUIS27_R)
        with Locations(Location((58.853460423, -67.381197846, 0), (0, 0, 270))):
            Circle(CROQUIS27_R)
        with Locations(Location((54.186793756, -85.381197846, 0), (0, 0, 270))):
            Circle(CROQUIS27_R)
    extrude(amount=-CORTAR_EXTRUIR17_DEPTH, mode=Mode.SUBTRACT)

    # Croquis28 → Cortar-Extruir18 (cut)
    with BuildSketch(Plane.XZ.offset(-55)):
        Polygon((55.222779206, 81.385253968), (58.165375392, 84.280415625), (57.129389942, 88.276359503), (53.150808306, 89.377141725), (50.20821212, 86.481980068), (51.24419757, 82.48603619), align=None)
        Polygon((59.889445873, 63.385253968), (62.832042059, 66.280415625), (61.796056609, 70.276359503), (57.817474973, 71.377141725), (54.874878787, 68.481980068), (55.910864237, 64.48603619), align=None)
        Polygon((59.889445873, 1.614746032), (55.910864237, 0.51396381), (54.874878787, -3.481980068), (57.817474973, -6.377141725), (61.796056609, -5.276359503), (62.832042059, -1.280415625), align=None)
        Polygon((55.222779206, -16.385253968), (51.24419757, -17.48603619), (50.20821212, -21.481980068), (53.150808306, -24.377141725), (57.129389942, -23.276359503), (58.165375392, -19.280415625), align=None)
    extrude(amount=-CORTAR_EXTRUIR18_DEPTH, mode=Mode.SUBTRACT)

    # Croquis30 → Cortar-Extruir20 (cut, two sides: drawn at the far end of the back side and taken through both)
    with BuildSketch(Plane.XZ.offset(-55).offset(-CORTAR_EXTRUIR20_DEPTH_BACK)):
        with BuildLine():
            Line((123, 100), (-35, 100))
            Line((-35, 100), (-35, -35))
            Line((-35, -35), (123, -35))
            ThreePointArc((123, -35), (55.5, 32.5), (123, 100))
        make_face()
    extrude(amount=CORTAR_EXTRUIR20_DEPTH + CORTAR_EXTRUIR20_DEPTH_BACK, mode=Mode.SUBTRACT)

    # Croquis31 → Cortar-Extruir21 (cut, through all)
    with BuildSketch(Plane.XZ.offset(-65)):
        with Locations(Location((-22, 87, 0), (0, 0, 270))):
            Circle(CROQUIS31_R)
        with Locations(Location((25, 87, 0), (0, 0, 270))):
            Circle(CROQUIS31_R)
        with Locations(Location((25, -22, 0), (0, 0, 90))):
            Circle(CROQUIS31_R)
        with Locations(Location((-22, -22, 0), (0, 0, 90))):
            Circle(CROQUIS31_R)
    extrude(amount=-CORTAR_EXTRUIR21_DEPTH, mode=Mode.SUBTRACT)

    # Croquis32 → Cortar-Extruir22 (cut)
    with BuildSketch(Plane(origin=(0, 85, 0), x_dir=(1, 0, 0), z_dir=(0, 1, 0))):
        with Locations(Location((-22, 22, 0), (0, 0, 270))):
            Circle(CROQUIS32_R)
        with Locations(Location((25, 22, 0), (0, 0, 270))):
            Circle(CROQUIS32_R)
        with Locations(Location((-22, -87, 0), (0, 0, 270))):
            Circle(CROQUIS32_R)
        with Locations(Location((25, -87, 0), (0, 0, 270))):
            Circle(CROQUIS32_R)
    extrude(amount=-CORTAR_EXTRUIR22_DEPTH, mode=Mode.SUBTRACT)

    # Croquis33 → Saliente-Extruir6 (add)
    with BuildSketch(Plane.XZ.offset(-68).offset(SALIENTE_EXTRUIR6_START)):
        with Locations(Location((123, 32.5, 0), (0, 0, 270))):
            Circle(CROQUIS33_R)
        with Locations(Location((123, 32.5, 0), (0, 0, 270))):
            Circle(CROQUIS33_R_2, mode=Mode.SUBTRACT)
    extrude(amount=-SALIENTE_EXTRUIR6_DEPTH)

    # Croquis34 → Saliente-Extruir7 (add)
    with BuildSketch(Plane.XZ.offset(-64).offset(SALIENTE_EXTRUIR7_START)):
        with Locations(Location((123, 32.5, 0), (0, 0, 270))):
            Circle(CROQUIS34_R)
        with Locations(Location((123, 32.5, 0), (0, 0, 270))):
            Circle(CROQUIS34_R_2, mode=Mode.SUBTRACT)
    extrude(amount=-SALIENTE_EXTRUIR7_DEPTH)

    # Croquis35 → Saliente-Extruir8 (add)
    with BuildSketch(Plane.XZ.offset(-60.65).offset(SALIENTE_EXTRUIR8_START)):
        with Locations(Location((123, 32.5, 0), (0, 0, 90))):
            Circle(CROQUIS35_R)
        with Locations(Location((123, 32.5, 0), (0, 0, 270))):
            Circle(CROQUIS35_R_2, mode=Mode.SUBTRACT)
    extrude(amount=-SALIENTE_EXTRUIR8_DEPTH)

    # Croquis36 outside → Cortar-Extruir23 (cut, two sides: drawn at the far end of the back side and taken through both)
    with BuildSketch(Plane.XZ.offset(-65).offset(-CORTAR_EXTRUIR23_DEPTH_BACK)):
        with Locations((77.75, 32.5)):
            Rectangle(CROQUIS36_OUTSIDE_W, CROQUIS36_OUTSIDE_H)
        with BuildLine():
            Line((38, -35), (54.849357366, 29.990378412))
            ThreePointArc((54.849357366, 29.990378412), (55.169388384, 32.5), (54.849357366, 35.009621588))
            Line((54.849357366, 35.009621588), (38, 100))
            Line((38, 100), (-35, 100))
            Line((-35, 100), (-35, -35))
            Line((-35, -35), (38, -35))
        make_face(mode=Mode.SUBTRACT)
    extrude(amount=CORTAR_EXTRUIR23_DEPTH + CORTAR_EXTRUIR23_DEPTH_BACK, mode=Mode.SUBTRACT)

    # Croquis37 → Saliente-Extruir9 (add, up to next)
    with BuildSketch(Plane.XZ.offset(-65), mode=Mode.PRIVATE) as saliente_extruir9_sk1:
        with Locations((1.5, 1.5)):
            Circle(CROQUIS37_R)
    saliente_extruir9_tool1 = extrude(saliente_extruir9_sk1.sketch, amount=-SALIENTE_EXTRUIR9_REACH, mode=Mode.PRIVATE) - part.part
    # Croquis37 → Saliente-Extruir9 (add, up to next)
    with BuildSketch(Plane.XZ.offset(-65), mode=Mode.PRIVATE) as saliente_extruir9_sk2:
        with Locations((1.5, 63.5)):
            Circle(CROQUIS37_R)
    saliente_extruir9_tool2 = extrude(saliente_extruir9_sk2.sketch, amount=-SALIENTE_EXTRUIR9_REACH, mode=Mode.PRIVATE) - part.part
    add(saliente_extruir9_tool1.solids().sort_by_distance((1.5, 65, 1.5))[0])
    add(saliente_extruir9_tool2.solids().sort_by_distance((1.5, 65, 63.5))[0])

    # Vaciado1: read off the stored shape, not the designer's step
    # Vaciado1 outline → Vaciado1 (cut)
    with BuildSketch(Plane(origin=(0, 0, 0), x_dir=(1, 0, 0), z_dir=(0, 1, 0)).offset(VACIADO1_START)):
        with BuildLine():
            Line((-27, 10.543560763), (-27, -75.543560763))
            ThreePointArc((-27, -75.543560763), (-13.161165235, -78.161165235), (-10.543560763, -92))
            Line((-10.543560763, -92), (13.543560763, -92))
            ThreePointArc((13.543560763, -92), (18.73472068, -76.183518361), (35.037347766, -79.550057059))
            Line((35.037347766, -79.550057059), (44.415530092, -43.377068089))
            ThreePointArc((44.415530092, -43.377068089), (35.425, -32.5), (44.415530092, -21.622931911))
            Line((44.415530092, -21.622931911), (35.037347766, 14.550057059))
            ThreePointArc((35.037347766, 14.550057059), (18.73472068, 11.183518361), (13.543560763, 27))
            Line((13.543560763, 27), (-10.543560763, 27))
            ThreePointArc((-10.543560763, 27), (-13.161165235, 13.161165235), (-27, 10.543560763))
        make_face()
    extrude(amount=VACIADO1_DEPTH, mode=Mode.SUBTRACT)

    # Vaciado1 2 outline → Vaciado1 2 (cut)
    with BuildSketch(Plane(origin=(0, 0, 0), x_dir=(1, 0, 0), z_dir=(0, 1, 0)).offset(VACIADO1_START)):
        with BuildLine():
            Line((-27, -75.543560763), (-27, -77.766907344))
            ThreePointArc((-27, -77.766907344), (-14.575378798, -79.575378798), (-12.766907344, -92))
            Line((-12.766907344, -92), (-10.543560763, -92))
            ThreePointArc((-10.543560763, -92), (-13.161165235, -78.161165235), (-27, -75.543560763))
        make_face()
        with BuildLine():
            Line((-27, 12.766907344), (-27, 10.543560763))
            ThreePointArc((-27, 10.543560763), (-13.161165235, 13.161165235), (-10.543560763, 27))
            Line((-10.543560763, 27), (-12.766907344, 27))
            ThreePointArc((-12.766907344, 27), (-14.575378798, 14.575378798), (-27, 12.766907344))
        make_face()
        with BuildLine():
            ThreePointArc((35.037347766, -79.550057059), (18.73472068, -76.183518361), (13.543560763, -92))
            Line((13.543560763, -92), (15.766907344, -92))
            ThreePointArc((15.766907344, -92), (20.107244927, -77.70963145), (34.346398818, -82.21514586))
            Line((34.346398818, -82.21514586), (35.037347766, -79.550057059))
        make_face()
        with BuildLine():
            Line((15.766907344, 27), (13.543560763, 27))
            ThreePointArc((13.543560763, 27), (18.73472068, 11.183518361), (35.037347766, 14.550057059))
            Line((35.037347766, 14.550057059), (34.346398818, 17.21514586))
            ThreePointArc((34.346398818, 17.21514586), (20.107244927, 12.70963145), (15.766907344, 27))
        make_face()
    extrude(amount=VACIADO1_2_DEPTH, mode=Mode.SUBTRACT)

    # Vaciado1 3 outline → Vaciado1 3 (add)
    with BuildSketch(Plane.YZ.offset(VACIADO1_START_2)):
        Polygon((77, -27), (77, -25.762395693), (74.856406461, -27), align=None)
        Polygon((74.856406461, 92), (77, 90.762395693), (77, 92), align=None)
    extrude(amount=VACIADO1_3_DEPTH)


solid = part.part
